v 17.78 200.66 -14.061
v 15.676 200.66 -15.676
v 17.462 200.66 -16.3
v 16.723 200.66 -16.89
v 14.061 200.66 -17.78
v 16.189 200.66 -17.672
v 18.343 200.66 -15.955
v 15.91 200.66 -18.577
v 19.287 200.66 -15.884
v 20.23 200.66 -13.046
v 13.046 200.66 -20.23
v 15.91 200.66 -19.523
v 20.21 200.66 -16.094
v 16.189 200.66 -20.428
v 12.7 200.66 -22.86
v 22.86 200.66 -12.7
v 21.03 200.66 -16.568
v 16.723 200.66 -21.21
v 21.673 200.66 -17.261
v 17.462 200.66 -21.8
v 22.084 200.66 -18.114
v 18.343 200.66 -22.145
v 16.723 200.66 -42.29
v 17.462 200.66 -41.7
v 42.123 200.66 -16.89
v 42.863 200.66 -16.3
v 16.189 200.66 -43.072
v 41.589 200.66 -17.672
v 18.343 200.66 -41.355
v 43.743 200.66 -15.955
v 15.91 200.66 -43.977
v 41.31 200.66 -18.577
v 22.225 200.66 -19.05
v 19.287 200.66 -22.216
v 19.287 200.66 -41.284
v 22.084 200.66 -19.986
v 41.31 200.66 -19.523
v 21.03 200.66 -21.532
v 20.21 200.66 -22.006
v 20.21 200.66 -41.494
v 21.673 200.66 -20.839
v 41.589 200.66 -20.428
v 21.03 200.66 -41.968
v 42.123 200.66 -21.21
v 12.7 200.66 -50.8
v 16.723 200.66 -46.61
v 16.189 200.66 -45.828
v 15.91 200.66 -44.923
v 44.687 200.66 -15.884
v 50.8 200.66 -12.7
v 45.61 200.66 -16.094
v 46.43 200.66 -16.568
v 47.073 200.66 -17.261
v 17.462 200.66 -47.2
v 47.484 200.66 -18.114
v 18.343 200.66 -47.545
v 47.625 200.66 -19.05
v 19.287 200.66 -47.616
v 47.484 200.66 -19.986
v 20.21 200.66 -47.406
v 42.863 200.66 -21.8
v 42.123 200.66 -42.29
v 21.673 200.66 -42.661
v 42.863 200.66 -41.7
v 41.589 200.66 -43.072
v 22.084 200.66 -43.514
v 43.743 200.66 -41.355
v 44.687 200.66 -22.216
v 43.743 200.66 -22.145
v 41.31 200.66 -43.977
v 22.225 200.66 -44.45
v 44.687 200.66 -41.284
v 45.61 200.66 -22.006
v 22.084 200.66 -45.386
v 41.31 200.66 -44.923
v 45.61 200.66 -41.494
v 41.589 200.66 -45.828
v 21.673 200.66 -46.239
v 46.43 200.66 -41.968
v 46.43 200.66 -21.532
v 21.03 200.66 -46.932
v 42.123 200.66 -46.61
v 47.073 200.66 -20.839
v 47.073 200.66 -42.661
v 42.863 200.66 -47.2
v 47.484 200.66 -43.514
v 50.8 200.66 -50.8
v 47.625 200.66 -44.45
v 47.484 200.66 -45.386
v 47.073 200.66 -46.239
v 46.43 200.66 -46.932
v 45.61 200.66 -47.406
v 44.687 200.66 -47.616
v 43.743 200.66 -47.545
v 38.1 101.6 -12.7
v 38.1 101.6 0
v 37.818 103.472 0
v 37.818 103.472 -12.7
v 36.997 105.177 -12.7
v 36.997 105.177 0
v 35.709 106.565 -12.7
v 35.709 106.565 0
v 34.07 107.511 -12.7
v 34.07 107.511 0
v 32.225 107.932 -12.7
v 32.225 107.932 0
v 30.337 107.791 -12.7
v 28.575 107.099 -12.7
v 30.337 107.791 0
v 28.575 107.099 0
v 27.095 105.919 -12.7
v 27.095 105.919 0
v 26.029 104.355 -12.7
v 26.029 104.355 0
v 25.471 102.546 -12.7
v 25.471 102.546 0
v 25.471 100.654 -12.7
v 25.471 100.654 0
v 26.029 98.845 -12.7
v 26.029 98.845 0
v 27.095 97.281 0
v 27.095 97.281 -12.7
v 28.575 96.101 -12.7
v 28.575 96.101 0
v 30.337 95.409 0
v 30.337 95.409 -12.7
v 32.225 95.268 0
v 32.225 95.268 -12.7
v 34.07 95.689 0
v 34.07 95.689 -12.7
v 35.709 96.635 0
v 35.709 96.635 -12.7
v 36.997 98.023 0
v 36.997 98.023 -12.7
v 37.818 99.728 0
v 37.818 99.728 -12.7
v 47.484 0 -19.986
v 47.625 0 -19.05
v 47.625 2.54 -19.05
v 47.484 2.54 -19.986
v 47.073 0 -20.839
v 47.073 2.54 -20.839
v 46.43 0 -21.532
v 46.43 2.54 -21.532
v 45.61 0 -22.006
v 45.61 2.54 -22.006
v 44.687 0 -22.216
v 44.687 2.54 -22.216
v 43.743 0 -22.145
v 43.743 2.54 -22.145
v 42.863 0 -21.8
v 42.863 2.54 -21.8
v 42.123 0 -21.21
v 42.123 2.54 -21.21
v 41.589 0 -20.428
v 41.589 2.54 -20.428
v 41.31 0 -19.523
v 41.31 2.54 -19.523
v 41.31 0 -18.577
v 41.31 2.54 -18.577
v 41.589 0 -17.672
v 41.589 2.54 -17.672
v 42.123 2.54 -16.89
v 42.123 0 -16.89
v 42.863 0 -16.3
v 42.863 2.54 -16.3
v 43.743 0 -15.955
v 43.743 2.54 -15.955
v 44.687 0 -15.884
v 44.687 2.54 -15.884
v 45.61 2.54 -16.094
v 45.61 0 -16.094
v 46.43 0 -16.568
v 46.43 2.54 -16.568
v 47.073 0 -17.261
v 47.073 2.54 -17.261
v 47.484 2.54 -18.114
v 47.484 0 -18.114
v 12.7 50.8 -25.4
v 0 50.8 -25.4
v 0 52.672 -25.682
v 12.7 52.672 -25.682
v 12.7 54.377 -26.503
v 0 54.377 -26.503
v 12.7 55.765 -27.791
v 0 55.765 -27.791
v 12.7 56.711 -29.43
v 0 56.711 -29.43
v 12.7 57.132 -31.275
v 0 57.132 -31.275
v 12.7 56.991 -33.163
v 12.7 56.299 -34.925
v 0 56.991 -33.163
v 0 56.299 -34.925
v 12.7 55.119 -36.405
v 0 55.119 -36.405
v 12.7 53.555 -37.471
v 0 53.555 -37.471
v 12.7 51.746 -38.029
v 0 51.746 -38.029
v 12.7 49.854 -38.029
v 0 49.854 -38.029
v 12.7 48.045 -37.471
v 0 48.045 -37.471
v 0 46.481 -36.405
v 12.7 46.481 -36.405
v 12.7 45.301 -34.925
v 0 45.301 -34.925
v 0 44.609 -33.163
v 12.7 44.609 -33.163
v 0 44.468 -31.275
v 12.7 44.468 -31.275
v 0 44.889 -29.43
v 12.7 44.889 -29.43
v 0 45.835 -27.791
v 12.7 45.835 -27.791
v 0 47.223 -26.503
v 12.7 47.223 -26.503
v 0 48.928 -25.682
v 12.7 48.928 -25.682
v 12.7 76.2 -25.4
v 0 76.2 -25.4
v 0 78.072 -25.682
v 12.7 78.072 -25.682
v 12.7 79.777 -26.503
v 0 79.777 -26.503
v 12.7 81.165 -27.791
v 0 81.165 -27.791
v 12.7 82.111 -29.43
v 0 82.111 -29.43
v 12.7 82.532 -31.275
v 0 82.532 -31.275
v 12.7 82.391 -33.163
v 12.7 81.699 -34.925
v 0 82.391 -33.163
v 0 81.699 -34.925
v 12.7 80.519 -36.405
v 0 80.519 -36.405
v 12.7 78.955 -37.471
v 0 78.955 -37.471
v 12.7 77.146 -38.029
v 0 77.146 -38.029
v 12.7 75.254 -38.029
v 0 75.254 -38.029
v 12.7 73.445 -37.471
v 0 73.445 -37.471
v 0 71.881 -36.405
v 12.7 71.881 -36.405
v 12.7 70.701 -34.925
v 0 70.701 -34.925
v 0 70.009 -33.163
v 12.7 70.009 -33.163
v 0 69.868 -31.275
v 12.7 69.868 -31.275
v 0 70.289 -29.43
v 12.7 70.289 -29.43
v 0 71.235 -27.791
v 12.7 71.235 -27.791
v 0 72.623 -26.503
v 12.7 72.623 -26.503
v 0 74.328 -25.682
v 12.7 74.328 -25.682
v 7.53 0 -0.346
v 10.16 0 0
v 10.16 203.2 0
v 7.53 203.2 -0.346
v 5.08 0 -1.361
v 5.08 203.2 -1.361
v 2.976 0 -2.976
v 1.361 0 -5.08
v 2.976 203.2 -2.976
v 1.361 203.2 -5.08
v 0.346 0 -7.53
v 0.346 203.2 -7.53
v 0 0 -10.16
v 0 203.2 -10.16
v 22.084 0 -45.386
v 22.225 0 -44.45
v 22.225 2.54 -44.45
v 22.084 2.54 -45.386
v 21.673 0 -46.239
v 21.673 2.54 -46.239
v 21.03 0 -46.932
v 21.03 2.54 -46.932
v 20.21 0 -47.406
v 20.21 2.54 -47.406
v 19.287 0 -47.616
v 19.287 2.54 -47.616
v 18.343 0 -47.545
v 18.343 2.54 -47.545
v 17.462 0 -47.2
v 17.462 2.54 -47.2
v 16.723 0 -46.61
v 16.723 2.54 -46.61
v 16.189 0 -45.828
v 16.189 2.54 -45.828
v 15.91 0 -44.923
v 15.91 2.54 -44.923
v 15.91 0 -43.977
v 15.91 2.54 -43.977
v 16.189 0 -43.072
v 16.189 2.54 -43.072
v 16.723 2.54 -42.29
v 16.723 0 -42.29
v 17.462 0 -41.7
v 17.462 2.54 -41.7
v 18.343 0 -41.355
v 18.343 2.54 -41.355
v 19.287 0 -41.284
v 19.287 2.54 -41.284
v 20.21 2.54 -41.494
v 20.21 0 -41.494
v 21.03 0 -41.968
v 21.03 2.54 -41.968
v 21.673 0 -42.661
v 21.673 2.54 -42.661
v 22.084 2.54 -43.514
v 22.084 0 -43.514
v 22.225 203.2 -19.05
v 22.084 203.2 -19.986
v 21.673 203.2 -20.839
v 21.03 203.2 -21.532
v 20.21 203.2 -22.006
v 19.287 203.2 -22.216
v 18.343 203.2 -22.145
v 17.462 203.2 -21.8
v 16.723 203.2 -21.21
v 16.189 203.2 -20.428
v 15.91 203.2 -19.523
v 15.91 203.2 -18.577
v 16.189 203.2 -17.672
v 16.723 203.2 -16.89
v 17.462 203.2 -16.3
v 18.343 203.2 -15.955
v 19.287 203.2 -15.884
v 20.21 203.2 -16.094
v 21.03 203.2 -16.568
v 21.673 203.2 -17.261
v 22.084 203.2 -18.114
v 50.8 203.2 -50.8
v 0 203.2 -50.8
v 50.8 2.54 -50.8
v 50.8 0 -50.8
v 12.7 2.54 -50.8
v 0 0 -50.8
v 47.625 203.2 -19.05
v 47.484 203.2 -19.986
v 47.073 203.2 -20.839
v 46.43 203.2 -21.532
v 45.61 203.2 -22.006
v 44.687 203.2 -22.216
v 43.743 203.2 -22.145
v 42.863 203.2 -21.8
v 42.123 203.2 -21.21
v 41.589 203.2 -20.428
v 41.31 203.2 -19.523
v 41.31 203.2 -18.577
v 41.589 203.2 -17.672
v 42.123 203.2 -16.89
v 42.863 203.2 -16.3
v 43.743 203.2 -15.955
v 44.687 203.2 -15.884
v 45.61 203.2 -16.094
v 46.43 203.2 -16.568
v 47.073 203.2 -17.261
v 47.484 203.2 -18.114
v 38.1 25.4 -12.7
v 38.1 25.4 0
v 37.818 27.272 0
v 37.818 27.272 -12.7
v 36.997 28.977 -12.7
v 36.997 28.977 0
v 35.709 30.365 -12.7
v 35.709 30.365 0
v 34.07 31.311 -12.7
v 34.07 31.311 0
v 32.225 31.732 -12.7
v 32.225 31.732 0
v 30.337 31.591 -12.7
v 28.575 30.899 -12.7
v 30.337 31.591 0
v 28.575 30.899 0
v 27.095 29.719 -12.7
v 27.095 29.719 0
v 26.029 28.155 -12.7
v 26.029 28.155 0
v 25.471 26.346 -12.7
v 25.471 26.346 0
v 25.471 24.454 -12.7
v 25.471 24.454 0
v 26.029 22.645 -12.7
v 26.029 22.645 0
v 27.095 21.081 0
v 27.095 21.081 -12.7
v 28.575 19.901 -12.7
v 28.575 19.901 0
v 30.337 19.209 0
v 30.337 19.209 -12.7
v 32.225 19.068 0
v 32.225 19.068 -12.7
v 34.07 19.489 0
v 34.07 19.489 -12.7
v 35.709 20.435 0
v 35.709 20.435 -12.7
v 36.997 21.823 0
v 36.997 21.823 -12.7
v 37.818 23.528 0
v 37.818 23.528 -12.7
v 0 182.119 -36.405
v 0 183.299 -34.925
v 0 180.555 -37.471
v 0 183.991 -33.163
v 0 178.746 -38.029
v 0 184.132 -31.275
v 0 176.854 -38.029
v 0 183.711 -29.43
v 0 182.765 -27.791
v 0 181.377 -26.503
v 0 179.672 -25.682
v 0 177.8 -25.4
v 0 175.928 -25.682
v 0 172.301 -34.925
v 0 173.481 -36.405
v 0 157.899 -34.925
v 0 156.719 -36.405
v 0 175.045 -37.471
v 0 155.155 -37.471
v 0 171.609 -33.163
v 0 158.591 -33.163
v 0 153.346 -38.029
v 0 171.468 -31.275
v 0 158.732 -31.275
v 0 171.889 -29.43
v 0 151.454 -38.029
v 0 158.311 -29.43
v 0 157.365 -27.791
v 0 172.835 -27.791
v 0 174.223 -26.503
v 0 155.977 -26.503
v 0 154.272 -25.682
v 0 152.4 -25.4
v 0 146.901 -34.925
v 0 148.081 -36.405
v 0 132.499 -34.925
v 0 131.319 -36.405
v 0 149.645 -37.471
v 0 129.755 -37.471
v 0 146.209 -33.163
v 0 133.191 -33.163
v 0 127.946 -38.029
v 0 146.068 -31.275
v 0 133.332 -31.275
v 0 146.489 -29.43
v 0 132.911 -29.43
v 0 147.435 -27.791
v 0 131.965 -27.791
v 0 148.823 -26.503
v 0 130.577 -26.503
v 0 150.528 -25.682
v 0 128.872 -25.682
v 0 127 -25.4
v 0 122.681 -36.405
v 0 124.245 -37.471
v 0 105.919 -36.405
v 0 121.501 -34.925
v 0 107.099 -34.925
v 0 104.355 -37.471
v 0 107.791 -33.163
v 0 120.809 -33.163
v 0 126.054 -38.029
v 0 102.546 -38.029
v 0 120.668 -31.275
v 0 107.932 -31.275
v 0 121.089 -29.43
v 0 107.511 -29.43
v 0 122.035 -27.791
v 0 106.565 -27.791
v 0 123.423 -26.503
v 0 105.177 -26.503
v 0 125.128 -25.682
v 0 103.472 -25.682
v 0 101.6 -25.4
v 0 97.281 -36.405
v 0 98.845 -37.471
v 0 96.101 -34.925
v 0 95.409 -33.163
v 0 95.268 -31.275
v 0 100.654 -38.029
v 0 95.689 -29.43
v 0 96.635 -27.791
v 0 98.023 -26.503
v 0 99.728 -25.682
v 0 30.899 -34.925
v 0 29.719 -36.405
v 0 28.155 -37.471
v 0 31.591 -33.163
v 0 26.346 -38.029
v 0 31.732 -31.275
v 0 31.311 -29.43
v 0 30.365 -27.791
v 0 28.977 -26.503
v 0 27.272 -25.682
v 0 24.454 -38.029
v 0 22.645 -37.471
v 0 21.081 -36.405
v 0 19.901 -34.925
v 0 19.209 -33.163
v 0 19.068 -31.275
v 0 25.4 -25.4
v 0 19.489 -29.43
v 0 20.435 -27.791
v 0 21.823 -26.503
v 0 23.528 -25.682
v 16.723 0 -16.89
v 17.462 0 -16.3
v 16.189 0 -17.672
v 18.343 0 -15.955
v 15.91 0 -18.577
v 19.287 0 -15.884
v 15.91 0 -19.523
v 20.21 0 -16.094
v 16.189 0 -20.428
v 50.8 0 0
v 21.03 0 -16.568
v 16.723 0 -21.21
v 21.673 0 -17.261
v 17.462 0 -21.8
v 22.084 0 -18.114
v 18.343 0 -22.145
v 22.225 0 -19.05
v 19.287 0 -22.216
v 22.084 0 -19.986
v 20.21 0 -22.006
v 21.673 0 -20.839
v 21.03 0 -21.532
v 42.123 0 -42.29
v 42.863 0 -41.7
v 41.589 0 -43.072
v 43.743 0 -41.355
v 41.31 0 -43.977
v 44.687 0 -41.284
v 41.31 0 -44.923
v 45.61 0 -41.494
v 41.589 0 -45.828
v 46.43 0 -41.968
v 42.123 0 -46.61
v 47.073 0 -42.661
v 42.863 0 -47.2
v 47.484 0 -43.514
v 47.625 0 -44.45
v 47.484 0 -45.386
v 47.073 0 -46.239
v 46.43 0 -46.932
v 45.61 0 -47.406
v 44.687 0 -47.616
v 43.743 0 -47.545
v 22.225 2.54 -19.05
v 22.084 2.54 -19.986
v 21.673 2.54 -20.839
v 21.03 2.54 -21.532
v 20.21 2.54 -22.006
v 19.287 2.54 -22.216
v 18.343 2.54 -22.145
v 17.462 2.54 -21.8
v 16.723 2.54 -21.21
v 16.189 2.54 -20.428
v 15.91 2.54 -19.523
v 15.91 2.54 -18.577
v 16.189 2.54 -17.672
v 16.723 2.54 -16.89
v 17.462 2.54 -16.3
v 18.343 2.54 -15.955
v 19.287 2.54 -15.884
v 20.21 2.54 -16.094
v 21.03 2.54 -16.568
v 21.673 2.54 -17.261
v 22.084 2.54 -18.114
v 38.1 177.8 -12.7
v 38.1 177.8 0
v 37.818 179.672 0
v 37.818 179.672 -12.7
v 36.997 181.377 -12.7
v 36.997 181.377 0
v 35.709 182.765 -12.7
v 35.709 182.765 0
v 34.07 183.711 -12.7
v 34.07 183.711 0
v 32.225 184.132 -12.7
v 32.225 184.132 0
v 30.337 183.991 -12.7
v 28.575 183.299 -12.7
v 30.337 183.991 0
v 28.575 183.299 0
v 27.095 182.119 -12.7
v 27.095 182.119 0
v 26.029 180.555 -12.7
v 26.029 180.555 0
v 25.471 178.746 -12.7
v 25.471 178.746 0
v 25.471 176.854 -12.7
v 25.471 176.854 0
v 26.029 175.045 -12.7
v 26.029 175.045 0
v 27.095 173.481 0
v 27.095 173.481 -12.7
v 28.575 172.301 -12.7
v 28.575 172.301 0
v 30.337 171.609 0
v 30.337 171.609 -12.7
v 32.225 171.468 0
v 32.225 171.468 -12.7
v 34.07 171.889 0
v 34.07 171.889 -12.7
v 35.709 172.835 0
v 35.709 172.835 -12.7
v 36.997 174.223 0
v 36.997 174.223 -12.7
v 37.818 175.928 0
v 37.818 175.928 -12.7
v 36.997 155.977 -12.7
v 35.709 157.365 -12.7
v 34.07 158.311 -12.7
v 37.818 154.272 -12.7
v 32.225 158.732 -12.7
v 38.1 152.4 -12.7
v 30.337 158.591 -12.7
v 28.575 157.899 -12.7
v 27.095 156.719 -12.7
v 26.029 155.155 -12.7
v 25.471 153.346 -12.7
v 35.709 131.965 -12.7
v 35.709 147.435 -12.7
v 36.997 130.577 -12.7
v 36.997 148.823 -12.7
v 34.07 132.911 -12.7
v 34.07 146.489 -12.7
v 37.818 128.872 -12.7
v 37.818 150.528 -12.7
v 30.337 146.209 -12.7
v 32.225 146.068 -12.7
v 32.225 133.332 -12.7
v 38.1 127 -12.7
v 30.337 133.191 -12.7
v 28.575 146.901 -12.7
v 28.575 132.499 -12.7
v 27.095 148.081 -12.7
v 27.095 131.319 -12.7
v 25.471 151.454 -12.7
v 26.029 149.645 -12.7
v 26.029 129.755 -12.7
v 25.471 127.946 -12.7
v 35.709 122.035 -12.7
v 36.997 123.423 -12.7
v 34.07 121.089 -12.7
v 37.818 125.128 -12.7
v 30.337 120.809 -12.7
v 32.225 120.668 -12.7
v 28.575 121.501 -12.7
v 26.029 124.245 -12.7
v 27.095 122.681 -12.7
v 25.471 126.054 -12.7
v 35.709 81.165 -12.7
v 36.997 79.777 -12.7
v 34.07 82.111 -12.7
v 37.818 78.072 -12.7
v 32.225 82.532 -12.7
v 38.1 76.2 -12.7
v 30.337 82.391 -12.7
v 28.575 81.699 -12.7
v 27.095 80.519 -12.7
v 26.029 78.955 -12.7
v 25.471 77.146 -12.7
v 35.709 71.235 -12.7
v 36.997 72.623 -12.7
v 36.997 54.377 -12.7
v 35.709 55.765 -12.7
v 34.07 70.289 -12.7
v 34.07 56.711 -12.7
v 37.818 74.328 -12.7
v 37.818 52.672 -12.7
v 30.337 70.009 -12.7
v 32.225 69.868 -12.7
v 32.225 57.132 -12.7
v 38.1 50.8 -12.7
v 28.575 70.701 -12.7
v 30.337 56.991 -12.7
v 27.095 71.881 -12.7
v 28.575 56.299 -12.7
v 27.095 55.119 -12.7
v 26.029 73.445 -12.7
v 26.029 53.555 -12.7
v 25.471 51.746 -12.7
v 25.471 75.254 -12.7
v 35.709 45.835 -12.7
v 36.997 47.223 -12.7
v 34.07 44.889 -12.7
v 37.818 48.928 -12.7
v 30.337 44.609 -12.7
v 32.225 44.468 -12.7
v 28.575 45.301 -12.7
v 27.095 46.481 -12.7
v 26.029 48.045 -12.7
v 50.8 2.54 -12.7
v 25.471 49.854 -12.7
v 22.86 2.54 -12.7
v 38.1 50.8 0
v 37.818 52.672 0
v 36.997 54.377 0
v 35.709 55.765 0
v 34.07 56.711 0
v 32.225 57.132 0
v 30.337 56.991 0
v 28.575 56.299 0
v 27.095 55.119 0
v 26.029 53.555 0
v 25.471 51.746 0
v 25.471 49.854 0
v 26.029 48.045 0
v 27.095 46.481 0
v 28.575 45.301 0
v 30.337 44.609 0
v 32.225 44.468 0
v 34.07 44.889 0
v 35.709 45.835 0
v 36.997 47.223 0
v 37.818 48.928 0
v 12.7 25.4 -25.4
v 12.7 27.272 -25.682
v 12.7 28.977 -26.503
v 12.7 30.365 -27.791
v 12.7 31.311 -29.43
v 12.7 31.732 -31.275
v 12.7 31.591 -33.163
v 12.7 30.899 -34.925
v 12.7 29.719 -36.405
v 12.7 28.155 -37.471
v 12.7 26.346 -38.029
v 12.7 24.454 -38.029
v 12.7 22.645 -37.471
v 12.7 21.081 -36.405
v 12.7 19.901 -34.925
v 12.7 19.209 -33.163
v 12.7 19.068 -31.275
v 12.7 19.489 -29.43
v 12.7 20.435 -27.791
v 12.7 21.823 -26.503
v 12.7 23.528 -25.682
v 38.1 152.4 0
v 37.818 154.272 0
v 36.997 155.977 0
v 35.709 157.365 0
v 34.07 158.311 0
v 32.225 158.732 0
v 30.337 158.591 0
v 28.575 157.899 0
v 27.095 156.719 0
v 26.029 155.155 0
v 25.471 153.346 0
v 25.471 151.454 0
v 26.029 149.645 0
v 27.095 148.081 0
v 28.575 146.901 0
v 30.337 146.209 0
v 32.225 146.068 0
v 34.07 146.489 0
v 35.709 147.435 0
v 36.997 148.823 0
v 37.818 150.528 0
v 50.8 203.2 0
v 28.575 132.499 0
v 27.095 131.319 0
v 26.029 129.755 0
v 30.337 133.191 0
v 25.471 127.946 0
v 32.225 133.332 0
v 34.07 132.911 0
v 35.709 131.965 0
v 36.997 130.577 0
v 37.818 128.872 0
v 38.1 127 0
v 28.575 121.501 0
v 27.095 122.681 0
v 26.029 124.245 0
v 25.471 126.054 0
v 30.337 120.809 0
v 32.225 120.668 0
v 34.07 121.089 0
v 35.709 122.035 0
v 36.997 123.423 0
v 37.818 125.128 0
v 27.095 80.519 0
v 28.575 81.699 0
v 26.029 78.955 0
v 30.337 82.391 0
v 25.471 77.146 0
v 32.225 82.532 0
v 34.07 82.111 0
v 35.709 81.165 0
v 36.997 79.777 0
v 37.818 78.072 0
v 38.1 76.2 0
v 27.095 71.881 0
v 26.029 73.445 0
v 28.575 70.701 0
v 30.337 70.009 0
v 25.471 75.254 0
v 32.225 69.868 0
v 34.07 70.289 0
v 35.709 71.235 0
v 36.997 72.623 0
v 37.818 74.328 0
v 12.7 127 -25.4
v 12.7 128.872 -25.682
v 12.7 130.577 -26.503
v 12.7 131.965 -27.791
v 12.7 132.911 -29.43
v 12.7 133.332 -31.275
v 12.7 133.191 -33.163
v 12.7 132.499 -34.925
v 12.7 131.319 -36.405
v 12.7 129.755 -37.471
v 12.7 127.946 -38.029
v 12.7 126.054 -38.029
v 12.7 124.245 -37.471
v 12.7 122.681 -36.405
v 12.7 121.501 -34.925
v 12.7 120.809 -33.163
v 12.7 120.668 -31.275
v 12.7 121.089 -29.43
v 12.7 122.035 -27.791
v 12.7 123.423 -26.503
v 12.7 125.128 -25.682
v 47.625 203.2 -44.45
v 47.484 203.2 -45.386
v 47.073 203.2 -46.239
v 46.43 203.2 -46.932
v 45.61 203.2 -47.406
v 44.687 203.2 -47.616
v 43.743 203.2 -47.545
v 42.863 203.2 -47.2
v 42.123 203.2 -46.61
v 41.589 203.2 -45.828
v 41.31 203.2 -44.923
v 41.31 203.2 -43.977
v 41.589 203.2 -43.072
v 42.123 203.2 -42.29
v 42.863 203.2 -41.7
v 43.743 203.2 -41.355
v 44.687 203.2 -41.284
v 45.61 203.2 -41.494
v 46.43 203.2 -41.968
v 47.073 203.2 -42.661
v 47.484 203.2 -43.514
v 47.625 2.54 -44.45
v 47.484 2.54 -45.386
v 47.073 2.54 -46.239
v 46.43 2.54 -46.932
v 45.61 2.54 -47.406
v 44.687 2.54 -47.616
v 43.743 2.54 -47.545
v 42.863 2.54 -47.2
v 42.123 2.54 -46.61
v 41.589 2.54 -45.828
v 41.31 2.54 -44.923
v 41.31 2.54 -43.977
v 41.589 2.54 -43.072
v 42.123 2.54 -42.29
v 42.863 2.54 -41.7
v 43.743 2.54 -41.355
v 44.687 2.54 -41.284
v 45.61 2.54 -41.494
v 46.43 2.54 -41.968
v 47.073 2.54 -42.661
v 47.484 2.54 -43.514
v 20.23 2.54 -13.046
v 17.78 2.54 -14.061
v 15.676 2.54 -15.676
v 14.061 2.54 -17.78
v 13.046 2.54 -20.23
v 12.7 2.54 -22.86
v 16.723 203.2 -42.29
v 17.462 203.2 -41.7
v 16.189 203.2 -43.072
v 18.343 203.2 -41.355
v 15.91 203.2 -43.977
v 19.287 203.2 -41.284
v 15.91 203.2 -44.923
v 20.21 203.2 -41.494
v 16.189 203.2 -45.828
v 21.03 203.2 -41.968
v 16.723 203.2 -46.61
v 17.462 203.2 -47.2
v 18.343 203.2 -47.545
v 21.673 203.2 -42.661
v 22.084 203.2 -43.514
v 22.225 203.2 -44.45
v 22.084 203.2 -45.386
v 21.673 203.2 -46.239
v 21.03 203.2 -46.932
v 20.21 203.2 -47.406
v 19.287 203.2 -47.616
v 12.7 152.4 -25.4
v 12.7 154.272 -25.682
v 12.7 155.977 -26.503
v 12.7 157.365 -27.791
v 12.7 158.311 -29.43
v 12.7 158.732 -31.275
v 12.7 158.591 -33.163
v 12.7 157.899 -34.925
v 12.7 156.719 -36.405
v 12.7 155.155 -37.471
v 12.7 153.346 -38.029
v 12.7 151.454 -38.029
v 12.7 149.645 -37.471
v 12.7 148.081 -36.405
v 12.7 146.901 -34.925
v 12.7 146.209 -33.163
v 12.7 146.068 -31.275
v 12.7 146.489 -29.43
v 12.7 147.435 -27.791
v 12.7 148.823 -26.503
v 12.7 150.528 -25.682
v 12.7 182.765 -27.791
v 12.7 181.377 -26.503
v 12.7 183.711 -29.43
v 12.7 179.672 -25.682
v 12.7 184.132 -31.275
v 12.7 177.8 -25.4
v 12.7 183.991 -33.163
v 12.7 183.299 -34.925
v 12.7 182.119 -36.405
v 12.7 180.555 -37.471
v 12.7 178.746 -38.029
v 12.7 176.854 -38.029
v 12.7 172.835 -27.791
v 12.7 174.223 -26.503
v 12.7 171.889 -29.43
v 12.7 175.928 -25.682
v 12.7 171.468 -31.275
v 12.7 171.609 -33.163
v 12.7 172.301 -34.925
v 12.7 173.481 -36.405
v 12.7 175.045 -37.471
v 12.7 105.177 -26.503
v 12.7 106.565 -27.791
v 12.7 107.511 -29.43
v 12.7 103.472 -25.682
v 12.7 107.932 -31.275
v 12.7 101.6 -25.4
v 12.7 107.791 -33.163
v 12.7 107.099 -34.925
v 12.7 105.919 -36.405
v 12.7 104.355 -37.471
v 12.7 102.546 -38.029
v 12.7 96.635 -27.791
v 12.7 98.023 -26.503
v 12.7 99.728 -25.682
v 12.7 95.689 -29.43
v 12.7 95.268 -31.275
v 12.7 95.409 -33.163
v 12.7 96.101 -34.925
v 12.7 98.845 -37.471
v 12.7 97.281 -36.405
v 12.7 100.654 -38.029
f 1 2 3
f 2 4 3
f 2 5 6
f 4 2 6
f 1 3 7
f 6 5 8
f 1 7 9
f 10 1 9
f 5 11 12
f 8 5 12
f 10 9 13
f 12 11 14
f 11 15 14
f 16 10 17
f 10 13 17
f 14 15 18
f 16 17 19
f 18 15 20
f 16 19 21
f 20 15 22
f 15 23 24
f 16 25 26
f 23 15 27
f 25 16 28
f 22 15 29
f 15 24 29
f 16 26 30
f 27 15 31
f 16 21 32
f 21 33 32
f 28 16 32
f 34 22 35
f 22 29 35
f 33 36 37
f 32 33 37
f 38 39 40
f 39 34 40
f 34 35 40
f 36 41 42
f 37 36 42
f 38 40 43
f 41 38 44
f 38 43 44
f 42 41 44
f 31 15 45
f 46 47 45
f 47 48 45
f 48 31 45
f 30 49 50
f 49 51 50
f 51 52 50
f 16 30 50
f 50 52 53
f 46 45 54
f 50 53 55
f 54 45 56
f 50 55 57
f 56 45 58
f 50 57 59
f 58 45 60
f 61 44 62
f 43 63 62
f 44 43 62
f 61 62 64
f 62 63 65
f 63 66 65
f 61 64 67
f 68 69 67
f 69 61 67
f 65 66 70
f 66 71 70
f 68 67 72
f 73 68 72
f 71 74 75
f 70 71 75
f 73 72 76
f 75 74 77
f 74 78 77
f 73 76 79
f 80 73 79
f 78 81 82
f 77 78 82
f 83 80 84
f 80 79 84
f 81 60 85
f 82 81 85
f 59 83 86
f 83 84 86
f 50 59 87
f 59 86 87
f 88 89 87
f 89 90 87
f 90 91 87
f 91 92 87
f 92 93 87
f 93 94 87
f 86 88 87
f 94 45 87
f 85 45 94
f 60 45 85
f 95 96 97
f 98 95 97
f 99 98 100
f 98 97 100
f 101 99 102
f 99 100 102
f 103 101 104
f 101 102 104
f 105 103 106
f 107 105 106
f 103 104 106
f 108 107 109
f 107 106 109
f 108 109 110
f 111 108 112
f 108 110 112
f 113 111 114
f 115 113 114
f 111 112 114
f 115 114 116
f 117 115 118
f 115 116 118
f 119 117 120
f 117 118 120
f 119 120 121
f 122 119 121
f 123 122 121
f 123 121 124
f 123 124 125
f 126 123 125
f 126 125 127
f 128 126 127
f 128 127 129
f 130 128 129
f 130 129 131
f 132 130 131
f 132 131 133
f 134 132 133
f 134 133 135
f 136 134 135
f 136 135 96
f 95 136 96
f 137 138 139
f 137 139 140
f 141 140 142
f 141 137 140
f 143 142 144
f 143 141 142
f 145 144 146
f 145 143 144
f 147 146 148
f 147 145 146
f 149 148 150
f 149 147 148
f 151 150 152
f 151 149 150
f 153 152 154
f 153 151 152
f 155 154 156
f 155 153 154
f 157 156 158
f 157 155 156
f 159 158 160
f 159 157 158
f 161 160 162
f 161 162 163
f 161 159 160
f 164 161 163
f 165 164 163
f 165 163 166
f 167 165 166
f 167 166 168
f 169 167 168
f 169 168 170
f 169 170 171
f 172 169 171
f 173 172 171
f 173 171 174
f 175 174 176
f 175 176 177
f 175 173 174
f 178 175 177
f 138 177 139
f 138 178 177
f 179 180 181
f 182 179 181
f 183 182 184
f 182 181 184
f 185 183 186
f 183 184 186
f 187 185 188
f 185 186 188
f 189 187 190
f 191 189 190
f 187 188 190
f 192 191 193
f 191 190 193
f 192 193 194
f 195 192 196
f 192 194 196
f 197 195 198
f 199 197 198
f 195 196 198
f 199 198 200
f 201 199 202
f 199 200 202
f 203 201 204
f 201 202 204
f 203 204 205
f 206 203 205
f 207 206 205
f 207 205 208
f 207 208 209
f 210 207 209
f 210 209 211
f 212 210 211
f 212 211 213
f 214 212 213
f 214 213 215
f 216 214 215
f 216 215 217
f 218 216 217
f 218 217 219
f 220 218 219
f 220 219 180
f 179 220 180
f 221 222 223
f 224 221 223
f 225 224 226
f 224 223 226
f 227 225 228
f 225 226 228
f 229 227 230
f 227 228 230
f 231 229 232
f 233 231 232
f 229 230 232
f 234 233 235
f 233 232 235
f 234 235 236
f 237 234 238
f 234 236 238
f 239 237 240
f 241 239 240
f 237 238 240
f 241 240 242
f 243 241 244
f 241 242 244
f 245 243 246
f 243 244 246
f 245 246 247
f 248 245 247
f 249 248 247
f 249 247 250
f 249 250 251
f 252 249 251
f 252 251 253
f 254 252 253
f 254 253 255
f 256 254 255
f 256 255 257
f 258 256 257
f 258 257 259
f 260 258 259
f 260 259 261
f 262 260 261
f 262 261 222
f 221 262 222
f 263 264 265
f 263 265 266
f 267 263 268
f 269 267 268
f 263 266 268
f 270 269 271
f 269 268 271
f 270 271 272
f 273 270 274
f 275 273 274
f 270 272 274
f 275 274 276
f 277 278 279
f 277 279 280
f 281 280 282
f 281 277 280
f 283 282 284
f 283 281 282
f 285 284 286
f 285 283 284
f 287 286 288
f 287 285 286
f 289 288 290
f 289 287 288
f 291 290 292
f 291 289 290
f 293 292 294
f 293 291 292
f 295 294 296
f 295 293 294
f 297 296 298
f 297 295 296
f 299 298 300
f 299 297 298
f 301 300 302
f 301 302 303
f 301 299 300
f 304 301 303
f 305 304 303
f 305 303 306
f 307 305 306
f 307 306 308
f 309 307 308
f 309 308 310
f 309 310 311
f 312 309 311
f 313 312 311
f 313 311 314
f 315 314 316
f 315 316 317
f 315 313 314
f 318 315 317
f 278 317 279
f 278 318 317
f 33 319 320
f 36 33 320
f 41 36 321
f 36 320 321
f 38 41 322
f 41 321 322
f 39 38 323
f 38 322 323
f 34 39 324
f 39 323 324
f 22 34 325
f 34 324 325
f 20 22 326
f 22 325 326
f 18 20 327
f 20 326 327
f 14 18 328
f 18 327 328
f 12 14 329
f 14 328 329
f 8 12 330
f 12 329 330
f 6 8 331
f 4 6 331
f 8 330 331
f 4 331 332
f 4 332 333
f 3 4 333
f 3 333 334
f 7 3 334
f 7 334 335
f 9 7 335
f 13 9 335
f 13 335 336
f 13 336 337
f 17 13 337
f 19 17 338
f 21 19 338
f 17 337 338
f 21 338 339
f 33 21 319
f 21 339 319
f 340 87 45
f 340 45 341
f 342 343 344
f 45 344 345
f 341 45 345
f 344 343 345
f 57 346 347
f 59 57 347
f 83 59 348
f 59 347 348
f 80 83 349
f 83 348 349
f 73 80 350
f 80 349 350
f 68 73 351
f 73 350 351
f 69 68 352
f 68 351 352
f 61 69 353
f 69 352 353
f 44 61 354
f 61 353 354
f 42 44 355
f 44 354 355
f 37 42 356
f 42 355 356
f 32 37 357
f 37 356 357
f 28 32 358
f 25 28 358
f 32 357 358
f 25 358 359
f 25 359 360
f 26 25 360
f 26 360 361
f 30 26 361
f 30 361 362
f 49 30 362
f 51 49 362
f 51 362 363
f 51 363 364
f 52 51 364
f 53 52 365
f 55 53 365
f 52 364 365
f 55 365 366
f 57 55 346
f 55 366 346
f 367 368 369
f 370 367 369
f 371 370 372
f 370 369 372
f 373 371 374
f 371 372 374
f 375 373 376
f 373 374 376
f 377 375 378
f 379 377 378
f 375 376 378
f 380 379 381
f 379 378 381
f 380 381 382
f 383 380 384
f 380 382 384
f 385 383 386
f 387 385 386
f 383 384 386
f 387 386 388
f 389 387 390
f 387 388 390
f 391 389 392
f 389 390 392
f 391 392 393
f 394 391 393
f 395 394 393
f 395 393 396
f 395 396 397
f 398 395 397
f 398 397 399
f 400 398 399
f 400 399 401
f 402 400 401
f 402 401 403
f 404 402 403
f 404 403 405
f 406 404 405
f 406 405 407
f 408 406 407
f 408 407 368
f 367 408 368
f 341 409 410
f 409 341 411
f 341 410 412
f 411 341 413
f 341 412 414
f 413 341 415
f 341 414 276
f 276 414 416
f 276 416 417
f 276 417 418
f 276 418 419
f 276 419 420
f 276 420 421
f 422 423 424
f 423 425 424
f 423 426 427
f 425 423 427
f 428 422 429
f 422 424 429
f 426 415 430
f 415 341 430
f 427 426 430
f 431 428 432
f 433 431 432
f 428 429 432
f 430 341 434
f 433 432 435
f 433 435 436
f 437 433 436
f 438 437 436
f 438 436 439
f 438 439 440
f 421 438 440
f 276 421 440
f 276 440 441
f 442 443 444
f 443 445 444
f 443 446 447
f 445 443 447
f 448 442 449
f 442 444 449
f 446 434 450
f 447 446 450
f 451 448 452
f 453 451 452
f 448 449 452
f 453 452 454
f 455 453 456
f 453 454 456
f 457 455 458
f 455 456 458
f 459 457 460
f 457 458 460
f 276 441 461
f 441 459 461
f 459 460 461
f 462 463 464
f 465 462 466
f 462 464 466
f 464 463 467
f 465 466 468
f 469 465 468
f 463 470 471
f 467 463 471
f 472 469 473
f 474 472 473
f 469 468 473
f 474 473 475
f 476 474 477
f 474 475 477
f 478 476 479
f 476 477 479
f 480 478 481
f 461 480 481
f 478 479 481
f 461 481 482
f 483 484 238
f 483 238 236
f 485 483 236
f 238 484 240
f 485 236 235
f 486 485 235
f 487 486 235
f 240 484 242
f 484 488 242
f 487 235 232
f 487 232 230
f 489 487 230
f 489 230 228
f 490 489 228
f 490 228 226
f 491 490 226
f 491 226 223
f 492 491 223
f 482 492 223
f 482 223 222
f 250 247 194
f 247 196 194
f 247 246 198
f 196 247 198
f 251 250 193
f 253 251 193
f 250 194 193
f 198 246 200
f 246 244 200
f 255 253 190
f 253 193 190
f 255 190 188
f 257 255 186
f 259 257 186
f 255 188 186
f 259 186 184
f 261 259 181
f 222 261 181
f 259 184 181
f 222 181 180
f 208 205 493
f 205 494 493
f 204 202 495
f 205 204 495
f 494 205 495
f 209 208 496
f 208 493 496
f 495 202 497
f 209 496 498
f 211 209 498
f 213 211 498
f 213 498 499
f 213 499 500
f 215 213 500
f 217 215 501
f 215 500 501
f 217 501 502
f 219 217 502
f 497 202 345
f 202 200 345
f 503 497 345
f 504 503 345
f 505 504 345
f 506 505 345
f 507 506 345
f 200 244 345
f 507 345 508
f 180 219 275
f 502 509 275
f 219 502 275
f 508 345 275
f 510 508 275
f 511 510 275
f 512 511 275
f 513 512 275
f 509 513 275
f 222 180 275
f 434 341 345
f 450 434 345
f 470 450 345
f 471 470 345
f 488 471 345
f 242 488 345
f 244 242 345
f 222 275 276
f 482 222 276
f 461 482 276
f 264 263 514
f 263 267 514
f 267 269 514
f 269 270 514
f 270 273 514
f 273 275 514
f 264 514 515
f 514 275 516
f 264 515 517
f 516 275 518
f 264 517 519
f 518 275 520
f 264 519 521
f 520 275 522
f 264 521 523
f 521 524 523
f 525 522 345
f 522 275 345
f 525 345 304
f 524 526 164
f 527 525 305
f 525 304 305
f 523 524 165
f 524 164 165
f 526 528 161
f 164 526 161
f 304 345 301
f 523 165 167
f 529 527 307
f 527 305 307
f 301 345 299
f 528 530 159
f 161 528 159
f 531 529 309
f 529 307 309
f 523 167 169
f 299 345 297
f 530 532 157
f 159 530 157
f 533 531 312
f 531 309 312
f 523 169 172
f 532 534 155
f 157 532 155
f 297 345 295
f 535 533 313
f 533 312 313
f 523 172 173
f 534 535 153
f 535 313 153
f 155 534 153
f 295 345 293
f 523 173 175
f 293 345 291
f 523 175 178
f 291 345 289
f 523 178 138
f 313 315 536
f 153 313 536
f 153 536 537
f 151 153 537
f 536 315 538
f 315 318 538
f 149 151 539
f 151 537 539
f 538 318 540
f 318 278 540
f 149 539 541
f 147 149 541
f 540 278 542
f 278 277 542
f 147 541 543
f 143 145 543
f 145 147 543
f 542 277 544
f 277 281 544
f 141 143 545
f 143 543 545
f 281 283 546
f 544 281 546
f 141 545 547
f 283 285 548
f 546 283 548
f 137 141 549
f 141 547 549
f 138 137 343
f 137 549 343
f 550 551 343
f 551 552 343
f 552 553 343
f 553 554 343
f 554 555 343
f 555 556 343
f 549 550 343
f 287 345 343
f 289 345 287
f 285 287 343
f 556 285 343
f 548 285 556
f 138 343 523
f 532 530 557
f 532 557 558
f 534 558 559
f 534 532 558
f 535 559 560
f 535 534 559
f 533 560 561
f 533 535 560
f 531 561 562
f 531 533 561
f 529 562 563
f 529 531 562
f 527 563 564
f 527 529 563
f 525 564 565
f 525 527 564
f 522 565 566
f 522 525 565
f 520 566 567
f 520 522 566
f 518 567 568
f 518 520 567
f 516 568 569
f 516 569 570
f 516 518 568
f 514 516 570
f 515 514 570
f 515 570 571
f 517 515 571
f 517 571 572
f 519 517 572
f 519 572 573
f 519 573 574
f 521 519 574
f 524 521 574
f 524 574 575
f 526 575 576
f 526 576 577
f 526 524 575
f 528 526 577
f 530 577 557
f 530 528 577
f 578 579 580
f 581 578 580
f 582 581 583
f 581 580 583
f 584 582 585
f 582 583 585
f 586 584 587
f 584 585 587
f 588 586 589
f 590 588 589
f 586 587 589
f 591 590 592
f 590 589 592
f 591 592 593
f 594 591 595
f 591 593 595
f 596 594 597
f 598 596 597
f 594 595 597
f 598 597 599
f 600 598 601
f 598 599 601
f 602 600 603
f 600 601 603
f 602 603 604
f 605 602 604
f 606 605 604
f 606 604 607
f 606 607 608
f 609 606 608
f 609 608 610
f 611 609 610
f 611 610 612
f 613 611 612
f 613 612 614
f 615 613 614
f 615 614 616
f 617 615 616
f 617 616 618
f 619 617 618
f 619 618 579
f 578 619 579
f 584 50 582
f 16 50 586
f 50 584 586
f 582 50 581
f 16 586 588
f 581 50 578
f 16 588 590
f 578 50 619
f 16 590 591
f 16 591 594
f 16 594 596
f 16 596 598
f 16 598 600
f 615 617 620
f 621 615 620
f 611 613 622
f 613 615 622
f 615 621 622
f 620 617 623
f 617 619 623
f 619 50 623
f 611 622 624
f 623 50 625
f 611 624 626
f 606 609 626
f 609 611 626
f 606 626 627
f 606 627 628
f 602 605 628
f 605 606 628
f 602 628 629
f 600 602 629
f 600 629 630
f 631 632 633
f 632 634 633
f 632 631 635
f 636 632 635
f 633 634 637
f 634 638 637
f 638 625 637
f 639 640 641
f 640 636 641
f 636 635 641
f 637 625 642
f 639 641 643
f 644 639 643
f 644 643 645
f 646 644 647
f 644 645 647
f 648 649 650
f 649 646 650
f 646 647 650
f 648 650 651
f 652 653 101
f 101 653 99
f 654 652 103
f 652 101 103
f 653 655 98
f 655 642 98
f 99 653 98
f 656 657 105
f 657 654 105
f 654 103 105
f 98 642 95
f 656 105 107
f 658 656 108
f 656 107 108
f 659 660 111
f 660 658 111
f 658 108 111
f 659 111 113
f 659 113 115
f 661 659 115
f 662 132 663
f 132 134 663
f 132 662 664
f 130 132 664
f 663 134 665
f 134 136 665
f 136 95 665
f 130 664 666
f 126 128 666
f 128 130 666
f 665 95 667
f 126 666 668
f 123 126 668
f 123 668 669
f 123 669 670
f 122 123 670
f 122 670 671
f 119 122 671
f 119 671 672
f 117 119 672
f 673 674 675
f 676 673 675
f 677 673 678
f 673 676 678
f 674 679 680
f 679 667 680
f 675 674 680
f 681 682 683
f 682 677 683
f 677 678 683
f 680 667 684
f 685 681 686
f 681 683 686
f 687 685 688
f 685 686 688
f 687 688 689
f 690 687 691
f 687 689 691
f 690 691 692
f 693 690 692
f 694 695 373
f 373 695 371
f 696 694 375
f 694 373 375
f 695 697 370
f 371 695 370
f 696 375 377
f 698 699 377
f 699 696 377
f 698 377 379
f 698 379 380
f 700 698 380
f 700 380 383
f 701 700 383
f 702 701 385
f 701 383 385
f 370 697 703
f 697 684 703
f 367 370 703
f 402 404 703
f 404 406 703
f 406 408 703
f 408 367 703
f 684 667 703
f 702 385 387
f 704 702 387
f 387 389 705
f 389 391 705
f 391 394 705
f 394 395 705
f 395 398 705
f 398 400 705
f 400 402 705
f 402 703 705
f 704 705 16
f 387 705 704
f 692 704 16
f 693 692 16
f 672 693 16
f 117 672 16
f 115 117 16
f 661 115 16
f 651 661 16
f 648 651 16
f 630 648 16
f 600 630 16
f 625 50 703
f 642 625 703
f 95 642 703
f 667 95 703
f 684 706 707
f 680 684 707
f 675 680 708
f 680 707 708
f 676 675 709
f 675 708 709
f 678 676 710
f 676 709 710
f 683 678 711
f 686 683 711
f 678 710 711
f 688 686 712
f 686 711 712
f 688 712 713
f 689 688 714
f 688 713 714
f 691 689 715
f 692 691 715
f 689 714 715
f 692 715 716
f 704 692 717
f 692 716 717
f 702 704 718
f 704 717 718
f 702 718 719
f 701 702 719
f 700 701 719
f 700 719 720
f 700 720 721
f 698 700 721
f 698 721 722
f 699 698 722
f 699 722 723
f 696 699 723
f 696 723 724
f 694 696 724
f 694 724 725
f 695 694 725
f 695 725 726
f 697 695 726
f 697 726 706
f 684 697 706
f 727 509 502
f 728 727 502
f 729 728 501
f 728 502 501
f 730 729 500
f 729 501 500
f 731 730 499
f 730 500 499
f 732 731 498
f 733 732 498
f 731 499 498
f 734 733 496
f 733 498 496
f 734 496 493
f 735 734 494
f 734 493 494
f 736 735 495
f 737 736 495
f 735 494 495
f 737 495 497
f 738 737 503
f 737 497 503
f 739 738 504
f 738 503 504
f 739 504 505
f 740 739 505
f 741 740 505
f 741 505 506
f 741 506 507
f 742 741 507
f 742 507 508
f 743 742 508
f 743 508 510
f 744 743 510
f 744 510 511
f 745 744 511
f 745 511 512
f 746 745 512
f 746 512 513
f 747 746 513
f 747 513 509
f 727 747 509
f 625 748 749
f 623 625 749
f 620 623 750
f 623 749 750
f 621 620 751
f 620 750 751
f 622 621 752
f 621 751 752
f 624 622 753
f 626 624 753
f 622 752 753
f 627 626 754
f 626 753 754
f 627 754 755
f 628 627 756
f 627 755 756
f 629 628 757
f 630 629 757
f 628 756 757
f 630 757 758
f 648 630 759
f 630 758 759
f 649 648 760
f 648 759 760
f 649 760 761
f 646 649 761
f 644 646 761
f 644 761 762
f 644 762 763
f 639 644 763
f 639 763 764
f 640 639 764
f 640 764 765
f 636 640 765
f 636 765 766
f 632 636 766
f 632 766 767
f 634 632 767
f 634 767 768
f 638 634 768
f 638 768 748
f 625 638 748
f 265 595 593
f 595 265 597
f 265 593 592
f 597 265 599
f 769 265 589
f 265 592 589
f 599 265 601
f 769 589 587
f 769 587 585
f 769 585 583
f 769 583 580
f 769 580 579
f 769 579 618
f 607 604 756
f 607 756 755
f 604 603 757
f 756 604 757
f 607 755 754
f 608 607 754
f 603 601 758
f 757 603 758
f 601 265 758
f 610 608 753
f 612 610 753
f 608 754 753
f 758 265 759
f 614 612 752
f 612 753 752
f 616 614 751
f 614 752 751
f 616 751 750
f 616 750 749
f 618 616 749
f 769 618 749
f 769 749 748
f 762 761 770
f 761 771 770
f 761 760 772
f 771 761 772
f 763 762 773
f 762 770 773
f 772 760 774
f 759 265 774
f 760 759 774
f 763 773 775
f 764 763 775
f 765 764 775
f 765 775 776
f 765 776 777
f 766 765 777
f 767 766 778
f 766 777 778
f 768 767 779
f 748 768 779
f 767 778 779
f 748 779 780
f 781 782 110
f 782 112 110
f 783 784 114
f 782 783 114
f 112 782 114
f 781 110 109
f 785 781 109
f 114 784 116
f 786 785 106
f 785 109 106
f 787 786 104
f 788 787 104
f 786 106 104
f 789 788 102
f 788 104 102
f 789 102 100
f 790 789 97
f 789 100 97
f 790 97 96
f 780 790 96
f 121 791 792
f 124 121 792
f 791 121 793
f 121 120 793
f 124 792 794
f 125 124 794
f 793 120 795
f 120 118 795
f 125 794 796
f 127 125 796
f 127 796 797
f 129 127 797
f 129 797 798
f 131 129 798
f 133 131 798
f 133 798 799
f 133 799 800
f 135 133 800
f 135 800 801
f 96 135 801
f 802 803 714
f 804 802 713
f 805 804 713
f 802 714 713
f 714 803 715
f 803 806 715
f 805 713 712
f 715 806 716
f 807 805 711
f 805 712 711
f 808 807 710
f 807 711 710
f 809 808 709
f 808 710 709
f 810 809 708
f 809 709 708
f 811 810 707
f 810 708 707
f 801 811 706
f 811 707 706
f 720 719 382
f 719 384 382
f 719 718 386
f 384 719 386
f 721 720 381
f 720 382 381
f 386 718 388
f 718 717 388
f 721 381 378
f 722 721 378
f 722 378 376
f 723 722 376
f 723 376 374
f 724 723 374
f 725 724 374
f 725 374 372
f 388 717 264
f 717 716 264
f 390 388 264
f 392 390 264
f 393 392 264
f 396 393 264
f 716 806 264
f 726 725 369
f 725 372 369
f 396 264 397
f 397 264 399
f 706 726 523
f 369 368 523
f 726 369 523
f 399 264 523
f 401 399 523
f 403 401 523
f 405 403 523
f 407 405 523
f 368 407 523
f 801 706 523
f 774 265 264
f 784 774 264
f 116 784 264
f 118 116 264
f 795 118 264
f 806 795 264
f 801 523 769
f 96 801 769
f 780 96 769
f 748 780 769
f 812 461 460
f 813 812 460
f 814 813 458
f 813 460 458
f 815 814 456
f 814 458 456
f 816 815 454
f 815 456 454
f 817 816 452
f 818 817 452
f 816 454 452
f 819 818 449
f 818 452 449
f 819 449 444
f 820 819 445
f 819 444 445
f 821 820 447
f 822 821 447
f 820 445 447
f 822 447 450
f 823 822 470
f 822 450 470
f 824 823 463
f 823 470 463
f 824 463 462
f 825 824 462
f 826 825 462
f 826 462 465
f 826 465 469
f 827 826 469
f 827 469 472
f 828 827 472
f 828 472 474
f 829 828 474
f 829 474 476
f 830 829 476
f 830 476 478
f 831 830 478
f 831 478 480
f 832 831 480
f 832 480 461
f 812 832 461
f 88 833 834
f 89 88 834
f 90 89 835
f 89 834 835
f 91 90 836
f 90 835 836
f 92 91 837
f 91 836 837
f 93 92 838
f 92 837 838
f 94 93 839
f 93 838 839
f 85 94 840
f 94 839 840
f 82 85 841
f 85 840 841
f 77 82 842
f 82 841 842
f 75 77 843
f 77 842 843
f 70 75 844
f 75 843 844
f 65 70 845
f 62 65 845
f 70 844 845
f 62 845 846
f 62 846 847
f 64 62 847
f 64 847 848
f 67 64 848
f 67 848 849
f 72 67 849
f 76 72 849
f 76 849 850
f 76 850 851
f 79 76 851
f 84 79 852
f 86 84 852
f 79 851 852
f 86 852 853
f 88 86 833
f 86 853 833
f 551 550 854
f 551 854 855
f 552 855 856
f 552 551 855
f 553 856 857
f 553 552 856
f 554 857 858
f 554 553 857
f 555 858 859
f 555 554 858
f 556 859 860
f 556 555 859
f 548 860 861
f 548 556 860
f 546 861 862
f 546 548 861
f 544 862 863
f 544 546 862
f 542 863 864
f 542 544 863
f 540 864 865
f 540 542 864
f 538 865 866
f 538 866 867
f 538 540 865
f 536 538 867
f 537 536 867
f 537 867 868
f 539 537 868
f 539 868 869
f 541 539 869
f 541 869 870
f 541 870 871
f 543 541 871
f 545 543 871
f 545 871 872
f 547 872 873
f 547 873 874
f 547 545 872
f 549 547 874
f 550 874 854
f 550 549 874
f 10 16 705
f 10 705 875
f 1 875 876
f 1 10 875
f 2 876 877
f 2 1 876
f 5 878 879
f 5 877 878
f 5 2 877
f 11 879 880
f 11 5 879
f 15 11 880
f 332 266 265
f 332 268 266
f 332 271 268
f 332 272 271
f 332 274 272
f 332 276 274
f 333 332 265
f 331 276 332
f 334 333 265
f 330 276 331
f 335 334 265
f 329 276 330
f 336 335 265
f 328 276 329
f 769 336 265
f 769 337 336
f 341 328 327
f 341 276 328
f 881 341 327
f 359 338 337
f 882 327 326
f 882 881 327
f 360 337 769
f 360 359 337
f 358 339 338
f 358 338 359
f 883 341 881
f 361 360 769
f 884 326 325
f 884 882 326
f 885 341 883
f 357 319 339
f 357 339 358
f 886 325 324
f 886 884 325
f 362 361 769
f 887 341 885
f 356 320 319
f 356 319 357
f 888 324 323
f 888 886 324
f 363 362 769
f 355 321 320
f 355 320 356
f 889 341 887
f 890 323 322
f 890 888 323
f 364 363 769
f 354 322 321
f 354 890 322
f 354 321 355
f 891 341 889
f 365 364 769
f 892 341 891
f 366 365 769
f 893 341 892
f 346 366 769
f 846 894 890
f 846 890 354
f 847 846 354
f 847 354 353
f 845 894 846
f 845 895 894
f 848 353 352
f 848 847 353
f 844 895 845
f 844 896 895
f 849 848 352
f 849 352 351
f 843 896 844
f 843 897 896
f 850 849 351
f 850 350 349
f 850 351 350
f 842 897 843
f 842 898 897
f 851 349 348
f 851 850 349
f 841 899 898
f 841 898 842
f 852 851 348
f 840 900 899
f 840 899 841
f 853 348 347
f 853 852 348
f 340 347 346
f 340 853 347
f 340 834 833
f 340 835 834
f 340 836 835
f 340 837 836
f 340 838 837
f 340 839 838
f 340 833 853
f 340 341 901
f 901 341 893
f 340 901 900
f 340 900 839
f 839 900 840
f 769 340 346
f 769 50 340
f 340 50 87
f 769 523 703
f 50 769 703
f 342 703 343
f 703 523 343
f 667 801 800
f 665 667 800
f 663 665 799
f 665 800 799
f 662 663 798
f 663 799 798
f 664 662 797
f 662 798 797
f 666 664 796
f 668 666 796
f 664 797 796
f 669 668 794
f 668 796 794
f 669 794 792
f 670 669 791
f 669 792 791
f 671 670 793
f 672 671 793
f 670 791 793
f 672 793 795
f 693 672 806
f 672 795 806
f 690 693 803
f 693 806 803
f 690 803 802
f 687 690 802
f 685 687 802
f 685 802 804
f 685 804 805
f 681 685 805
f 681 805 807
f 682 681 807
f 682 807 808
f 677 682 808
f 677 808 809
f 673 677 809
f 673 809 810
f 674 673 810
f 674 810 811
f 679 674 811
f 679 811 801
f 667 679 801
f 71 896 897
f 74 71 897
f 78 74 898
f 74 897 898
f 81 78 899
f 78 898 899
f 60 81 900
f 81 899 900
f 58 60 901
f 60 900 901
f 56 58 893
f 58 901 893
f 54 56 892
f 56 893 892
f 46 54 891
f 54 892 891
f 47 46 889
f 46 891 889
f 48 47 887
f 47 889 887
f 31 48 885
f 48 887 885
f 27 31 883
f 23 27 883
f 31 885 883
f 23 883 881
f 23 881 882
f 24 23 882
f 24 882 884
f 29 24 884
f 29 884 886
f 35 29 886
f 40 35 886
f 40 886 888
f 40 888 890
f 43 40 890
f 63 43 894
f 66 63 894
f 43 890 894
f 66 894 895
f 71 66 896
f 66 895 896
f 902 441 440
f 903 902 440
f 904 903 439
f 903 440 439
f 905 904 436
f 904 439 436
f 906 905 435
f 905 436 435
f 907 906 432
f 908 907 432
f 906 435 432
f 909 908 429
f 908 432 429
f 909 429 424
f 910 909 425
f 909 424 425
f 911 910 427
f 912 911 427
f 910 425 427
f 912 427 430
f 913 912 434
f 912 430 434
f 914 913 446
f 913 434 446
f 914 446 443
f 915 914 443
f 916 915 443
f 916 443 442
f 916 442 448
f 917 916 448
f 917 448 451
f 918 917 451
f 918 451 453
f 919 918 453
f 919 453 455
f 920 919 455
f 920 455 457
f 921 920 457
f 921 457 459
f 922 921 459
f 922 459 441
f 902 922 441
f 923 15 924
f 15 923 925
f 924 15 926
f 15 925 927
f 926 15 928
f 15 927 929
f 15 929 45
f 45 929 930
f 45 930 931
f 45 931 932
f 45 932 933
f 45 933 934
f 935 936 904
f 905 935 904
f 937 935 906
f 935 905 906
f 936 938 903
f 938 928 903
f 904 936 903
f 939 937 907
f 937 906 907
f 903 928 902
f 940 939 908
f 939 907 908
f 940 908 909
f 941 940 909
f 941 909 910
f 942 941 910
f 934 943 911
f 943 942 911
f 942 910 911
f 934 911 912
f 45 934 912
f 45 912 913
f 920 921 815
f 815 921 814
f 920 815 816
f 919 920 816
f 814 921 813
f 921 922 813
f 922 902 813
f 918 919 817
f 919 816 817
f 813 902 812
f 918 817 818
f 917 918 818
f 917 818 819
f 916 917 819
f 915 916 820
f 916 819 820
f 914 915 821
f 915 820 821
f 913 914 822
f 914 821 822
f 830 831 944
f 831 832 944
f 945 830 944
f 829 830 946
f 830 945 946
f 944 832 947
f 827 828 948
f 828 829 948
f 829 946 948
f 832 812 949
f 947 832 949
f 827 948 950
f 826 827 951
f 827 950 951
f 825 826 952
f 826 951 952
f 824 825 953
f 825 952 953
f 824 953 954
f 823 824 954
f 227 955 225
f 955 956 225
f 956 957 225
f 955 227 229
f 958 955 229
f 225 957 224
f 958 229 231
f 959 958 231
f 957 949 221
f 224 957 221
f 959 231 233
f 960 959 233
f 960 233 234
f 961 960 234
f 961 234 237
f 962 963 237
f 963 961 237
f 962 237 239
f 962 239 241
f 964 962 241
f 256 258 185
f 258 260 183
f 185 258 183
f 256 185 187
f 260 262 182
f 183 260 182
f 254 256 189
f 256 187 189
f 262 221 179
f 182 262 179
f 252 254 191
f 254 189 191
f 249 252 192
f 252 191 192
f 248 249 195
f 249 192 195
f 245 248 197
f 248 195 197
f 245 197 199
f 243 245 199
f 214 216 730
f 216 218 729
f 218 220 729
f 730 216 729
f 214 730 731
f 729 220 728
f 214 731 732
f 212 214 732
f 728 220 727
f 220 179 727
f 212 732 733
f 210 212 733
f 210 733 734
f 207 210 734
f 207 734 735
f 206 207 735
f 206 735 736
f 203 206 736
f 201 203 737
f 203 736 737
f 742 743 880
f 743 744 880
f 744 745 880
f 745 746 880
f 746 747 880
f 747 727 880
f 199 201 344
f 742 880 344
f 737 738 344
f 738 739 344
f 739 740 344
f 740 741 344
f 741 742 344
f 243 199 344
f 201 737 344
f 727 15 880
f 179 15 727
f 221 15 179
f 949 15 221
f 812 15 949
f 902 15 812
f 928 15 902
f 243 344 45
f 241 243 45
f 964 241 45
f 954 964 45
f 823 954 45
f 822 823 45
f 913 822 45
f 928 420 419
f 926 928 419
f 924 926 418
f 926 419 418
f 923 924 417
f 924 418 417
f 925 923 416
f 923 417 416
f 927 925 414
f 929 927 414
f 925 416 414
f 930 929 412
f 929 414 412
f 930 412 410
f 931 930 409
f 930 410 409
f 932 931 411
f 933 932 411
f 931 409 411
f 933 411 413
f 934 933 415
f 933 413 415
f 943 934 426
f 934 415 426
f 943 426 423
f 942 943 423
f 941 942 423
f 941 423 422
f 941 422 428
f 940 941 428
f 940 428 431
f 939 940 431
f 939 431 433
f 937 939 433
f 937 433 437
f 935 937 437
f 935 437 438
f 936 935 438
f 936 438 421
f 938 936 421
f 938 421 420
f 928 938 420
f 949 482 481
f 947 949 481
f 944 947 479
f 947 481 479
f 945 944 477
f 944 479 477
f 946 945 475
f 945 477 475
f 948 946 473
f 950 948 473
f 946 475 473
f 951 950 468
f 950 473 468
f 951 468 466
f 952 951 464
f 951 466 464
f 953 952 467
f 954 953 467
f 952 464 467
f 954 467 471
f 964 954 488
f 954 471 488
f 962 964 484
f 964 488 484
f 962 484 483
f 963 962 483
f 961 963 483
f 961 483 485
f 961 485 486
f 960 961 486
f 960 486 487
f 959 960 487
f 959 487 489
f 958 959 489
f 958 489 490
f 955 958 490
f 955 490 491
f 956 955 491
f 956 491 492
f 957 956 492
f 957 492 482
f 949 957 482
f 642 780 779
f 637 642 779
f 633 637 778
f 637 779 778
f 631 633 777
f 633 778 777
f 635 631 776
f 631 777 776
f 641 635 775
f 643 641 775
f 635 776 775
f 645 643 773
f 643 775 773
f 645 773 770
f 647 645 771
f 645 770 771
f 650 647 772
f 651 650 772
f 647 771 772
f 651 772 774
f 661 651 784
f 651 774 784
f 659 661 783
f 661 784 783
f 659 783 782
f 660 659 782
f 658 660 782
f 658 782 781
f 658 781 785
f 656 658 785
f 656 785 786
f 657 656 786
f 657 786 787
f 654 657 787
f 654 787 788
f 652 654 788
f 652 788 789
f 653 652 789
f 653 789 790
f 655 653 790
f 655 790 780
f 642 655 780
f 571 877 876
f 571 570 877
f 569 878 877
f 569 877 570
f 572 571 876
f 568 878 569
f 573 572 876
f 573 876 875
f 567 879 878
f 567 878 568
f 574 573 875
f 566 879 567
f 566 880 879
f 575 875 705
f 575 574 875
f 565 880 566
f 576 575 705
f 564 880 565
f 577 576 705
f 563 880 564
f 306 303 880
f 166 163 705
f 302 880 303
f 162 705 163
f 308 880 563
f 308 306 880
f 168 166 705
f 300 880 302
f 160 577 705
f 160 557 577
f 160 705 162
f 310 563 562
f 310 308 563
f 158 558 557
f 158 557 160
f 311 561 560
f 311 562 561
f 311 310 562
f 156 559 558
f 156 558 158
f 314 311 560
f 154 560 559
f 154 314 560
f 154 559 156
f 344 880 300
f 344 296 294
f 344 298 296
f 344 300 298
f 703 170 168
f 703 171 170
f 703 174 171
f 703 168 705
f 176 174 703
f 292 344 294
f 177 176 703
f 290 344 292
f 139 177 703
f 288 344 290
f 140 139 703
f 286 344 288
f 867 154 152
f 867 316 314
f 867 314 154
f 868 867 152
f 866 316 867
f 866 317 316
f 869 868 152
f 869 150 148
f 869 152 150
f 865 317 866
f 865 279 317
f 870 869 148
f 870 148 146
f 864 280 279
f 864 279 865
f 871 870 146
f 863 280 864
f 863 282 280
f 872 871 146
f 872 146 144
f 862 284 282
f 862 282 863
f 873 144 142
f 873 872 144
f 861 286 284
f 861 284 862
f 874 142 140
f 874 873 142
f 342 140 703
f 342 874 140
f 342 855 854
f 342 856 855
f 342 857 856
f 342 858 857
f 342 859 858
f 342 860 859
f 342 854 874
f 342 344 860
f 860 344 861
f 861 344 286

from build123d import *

# Parameters (mm, degrees)
BOSS_EXTRUDE1_DEPTH = 203.2
FILLET1_R           = 10.16
SKETCH3_R           = 6.35
CUT_EXTRUDE1_DEPTH  = 51.8
SKETCH4_R           = 6.35
CUT_EXTRUDE2_DEPTH  = 51.8
SKETCH5_R           = 3.175
BOSS_EXTRUDE2_DEPTH = 2.54


with BuildPart() as part:
    # Sketch2 → Boss-Extrude1 (new body)
    with BuildSketch(Plane(origin=(0, 0, 0), x_dir=(1, 0, 0), z_dir=(0, 1, 0))):
        Polygon((0, 0), (50.8, 0), (50.8, 12.7), (12.7, 12.7), (12.7, 50.8), (0, 50.8), align=None)
    extrude(amount=BOSS_EXTRUDE1_DEPTH)

    # Fillet1
    fillet1_edges = [part.edges().sort_by_distance(p)[0] for p in [
        (12.7, 101.6, -12.7),
        (0, 101.6, 0),
    ]]
    fillet(fillet1_edges, radius=FILLET1_R)

    # Sketch3 → Cut-Extrude1 (cut, through all)
    with BuildSketch(Plane.XY):
        with Locations((31.75, 177.8)):
            Circle(SKETCH3_R)
        with Locations((31.75, 152.4)):
            Circle(SKETCH3_R)
        with Locations((31.75, 127)):
            Circle(SKETCH3_R)
        with Locations((31.75, 101.6)):
            Circle(SKETCH3_R)
        with Locations((31.75, 76.2)):
            Circle(SKETCH3_R)
        with Locations((31.75, 50.8)):
            Circle(SKETCH3_R)
        with Locations((31.75, 25.4)):
            Circle(SKETCH3_R)
    extrude(amount=-CUT_EXTRUDE1_DEPTH, mode=Mode.SUBTRACT)

    # Sketch4 → Cut-Extrude2 (cut, through all)
    with BuildSketch(Plane.ZY):
        with Locations((-31.75, 177.8)):
            Circle(SKETCH4_R)
        with Locations((-31.75, 152.4)):
            Circle(SKETCH4_R)
        with Locations((-31.75, 127)):
            Circle(SKETCH4_R)
        with Locations((-31.75, 101.6)):
            Circle(SKETCH4_R)
        with Locations((-31.75, 76.2)):
            Circle(SKETCH4_R)
        with Locations((-31.75, 50.8)):
            Circle(SKETCH4_R)
        with Locations((-31.75, 25.4)):
            Circle(SKETCH4_R)
    extrude(amount=-CUT_EXTRUDE2_DEPTH, mode=Mode.SUBTRACT)

    # Sketch5 → Boss-Extrude2 (add)
    with BuildSketch(Plane(origin=(0, 203.2, 0), x_dir=(1, 0, 0), z_dir=(0, 1, 0))):
        with BuildLine():
            Line((50.8, 50.8), (12.7, 50.8))
            Line((12.7, 50.8), (12.7, 22.86))
            ThreePointArc((12.7, 22.86), (15.675795103, 15.675795103), (22.86, 12.7))
            Line((22.86, 12.7), (50.8, 12.7))
            Line((50.8, 12.7), (50.8, 50.8))
        make_face()
        with Locations((19.05, 19.05)):
            Circle(SKETCH5_R, mode=Mode.SUBTRACT)
        with Locations((44.45, 19.05)):
            Circle(SKETCH5_R, mode=Mode.SUBTRACT)
        with Locations((19.05, 44.45)):
            Circle(SKETCH5_R, mode=Mode.SUBTRACT)
        with Locations((44.45, 44.45)):
            Circle(SKETCH5_R, mode=Mode.SUBTRACT)
    boss_extrude2 = extrude(amount=-BOSS_EXTRUDE2_DEPTH)

    # Mirror1: Boss-Extrude2 across plane
    add(boss_extrude2.mirror(Plane.ZX.offset(101.6)))


solid = part.part
